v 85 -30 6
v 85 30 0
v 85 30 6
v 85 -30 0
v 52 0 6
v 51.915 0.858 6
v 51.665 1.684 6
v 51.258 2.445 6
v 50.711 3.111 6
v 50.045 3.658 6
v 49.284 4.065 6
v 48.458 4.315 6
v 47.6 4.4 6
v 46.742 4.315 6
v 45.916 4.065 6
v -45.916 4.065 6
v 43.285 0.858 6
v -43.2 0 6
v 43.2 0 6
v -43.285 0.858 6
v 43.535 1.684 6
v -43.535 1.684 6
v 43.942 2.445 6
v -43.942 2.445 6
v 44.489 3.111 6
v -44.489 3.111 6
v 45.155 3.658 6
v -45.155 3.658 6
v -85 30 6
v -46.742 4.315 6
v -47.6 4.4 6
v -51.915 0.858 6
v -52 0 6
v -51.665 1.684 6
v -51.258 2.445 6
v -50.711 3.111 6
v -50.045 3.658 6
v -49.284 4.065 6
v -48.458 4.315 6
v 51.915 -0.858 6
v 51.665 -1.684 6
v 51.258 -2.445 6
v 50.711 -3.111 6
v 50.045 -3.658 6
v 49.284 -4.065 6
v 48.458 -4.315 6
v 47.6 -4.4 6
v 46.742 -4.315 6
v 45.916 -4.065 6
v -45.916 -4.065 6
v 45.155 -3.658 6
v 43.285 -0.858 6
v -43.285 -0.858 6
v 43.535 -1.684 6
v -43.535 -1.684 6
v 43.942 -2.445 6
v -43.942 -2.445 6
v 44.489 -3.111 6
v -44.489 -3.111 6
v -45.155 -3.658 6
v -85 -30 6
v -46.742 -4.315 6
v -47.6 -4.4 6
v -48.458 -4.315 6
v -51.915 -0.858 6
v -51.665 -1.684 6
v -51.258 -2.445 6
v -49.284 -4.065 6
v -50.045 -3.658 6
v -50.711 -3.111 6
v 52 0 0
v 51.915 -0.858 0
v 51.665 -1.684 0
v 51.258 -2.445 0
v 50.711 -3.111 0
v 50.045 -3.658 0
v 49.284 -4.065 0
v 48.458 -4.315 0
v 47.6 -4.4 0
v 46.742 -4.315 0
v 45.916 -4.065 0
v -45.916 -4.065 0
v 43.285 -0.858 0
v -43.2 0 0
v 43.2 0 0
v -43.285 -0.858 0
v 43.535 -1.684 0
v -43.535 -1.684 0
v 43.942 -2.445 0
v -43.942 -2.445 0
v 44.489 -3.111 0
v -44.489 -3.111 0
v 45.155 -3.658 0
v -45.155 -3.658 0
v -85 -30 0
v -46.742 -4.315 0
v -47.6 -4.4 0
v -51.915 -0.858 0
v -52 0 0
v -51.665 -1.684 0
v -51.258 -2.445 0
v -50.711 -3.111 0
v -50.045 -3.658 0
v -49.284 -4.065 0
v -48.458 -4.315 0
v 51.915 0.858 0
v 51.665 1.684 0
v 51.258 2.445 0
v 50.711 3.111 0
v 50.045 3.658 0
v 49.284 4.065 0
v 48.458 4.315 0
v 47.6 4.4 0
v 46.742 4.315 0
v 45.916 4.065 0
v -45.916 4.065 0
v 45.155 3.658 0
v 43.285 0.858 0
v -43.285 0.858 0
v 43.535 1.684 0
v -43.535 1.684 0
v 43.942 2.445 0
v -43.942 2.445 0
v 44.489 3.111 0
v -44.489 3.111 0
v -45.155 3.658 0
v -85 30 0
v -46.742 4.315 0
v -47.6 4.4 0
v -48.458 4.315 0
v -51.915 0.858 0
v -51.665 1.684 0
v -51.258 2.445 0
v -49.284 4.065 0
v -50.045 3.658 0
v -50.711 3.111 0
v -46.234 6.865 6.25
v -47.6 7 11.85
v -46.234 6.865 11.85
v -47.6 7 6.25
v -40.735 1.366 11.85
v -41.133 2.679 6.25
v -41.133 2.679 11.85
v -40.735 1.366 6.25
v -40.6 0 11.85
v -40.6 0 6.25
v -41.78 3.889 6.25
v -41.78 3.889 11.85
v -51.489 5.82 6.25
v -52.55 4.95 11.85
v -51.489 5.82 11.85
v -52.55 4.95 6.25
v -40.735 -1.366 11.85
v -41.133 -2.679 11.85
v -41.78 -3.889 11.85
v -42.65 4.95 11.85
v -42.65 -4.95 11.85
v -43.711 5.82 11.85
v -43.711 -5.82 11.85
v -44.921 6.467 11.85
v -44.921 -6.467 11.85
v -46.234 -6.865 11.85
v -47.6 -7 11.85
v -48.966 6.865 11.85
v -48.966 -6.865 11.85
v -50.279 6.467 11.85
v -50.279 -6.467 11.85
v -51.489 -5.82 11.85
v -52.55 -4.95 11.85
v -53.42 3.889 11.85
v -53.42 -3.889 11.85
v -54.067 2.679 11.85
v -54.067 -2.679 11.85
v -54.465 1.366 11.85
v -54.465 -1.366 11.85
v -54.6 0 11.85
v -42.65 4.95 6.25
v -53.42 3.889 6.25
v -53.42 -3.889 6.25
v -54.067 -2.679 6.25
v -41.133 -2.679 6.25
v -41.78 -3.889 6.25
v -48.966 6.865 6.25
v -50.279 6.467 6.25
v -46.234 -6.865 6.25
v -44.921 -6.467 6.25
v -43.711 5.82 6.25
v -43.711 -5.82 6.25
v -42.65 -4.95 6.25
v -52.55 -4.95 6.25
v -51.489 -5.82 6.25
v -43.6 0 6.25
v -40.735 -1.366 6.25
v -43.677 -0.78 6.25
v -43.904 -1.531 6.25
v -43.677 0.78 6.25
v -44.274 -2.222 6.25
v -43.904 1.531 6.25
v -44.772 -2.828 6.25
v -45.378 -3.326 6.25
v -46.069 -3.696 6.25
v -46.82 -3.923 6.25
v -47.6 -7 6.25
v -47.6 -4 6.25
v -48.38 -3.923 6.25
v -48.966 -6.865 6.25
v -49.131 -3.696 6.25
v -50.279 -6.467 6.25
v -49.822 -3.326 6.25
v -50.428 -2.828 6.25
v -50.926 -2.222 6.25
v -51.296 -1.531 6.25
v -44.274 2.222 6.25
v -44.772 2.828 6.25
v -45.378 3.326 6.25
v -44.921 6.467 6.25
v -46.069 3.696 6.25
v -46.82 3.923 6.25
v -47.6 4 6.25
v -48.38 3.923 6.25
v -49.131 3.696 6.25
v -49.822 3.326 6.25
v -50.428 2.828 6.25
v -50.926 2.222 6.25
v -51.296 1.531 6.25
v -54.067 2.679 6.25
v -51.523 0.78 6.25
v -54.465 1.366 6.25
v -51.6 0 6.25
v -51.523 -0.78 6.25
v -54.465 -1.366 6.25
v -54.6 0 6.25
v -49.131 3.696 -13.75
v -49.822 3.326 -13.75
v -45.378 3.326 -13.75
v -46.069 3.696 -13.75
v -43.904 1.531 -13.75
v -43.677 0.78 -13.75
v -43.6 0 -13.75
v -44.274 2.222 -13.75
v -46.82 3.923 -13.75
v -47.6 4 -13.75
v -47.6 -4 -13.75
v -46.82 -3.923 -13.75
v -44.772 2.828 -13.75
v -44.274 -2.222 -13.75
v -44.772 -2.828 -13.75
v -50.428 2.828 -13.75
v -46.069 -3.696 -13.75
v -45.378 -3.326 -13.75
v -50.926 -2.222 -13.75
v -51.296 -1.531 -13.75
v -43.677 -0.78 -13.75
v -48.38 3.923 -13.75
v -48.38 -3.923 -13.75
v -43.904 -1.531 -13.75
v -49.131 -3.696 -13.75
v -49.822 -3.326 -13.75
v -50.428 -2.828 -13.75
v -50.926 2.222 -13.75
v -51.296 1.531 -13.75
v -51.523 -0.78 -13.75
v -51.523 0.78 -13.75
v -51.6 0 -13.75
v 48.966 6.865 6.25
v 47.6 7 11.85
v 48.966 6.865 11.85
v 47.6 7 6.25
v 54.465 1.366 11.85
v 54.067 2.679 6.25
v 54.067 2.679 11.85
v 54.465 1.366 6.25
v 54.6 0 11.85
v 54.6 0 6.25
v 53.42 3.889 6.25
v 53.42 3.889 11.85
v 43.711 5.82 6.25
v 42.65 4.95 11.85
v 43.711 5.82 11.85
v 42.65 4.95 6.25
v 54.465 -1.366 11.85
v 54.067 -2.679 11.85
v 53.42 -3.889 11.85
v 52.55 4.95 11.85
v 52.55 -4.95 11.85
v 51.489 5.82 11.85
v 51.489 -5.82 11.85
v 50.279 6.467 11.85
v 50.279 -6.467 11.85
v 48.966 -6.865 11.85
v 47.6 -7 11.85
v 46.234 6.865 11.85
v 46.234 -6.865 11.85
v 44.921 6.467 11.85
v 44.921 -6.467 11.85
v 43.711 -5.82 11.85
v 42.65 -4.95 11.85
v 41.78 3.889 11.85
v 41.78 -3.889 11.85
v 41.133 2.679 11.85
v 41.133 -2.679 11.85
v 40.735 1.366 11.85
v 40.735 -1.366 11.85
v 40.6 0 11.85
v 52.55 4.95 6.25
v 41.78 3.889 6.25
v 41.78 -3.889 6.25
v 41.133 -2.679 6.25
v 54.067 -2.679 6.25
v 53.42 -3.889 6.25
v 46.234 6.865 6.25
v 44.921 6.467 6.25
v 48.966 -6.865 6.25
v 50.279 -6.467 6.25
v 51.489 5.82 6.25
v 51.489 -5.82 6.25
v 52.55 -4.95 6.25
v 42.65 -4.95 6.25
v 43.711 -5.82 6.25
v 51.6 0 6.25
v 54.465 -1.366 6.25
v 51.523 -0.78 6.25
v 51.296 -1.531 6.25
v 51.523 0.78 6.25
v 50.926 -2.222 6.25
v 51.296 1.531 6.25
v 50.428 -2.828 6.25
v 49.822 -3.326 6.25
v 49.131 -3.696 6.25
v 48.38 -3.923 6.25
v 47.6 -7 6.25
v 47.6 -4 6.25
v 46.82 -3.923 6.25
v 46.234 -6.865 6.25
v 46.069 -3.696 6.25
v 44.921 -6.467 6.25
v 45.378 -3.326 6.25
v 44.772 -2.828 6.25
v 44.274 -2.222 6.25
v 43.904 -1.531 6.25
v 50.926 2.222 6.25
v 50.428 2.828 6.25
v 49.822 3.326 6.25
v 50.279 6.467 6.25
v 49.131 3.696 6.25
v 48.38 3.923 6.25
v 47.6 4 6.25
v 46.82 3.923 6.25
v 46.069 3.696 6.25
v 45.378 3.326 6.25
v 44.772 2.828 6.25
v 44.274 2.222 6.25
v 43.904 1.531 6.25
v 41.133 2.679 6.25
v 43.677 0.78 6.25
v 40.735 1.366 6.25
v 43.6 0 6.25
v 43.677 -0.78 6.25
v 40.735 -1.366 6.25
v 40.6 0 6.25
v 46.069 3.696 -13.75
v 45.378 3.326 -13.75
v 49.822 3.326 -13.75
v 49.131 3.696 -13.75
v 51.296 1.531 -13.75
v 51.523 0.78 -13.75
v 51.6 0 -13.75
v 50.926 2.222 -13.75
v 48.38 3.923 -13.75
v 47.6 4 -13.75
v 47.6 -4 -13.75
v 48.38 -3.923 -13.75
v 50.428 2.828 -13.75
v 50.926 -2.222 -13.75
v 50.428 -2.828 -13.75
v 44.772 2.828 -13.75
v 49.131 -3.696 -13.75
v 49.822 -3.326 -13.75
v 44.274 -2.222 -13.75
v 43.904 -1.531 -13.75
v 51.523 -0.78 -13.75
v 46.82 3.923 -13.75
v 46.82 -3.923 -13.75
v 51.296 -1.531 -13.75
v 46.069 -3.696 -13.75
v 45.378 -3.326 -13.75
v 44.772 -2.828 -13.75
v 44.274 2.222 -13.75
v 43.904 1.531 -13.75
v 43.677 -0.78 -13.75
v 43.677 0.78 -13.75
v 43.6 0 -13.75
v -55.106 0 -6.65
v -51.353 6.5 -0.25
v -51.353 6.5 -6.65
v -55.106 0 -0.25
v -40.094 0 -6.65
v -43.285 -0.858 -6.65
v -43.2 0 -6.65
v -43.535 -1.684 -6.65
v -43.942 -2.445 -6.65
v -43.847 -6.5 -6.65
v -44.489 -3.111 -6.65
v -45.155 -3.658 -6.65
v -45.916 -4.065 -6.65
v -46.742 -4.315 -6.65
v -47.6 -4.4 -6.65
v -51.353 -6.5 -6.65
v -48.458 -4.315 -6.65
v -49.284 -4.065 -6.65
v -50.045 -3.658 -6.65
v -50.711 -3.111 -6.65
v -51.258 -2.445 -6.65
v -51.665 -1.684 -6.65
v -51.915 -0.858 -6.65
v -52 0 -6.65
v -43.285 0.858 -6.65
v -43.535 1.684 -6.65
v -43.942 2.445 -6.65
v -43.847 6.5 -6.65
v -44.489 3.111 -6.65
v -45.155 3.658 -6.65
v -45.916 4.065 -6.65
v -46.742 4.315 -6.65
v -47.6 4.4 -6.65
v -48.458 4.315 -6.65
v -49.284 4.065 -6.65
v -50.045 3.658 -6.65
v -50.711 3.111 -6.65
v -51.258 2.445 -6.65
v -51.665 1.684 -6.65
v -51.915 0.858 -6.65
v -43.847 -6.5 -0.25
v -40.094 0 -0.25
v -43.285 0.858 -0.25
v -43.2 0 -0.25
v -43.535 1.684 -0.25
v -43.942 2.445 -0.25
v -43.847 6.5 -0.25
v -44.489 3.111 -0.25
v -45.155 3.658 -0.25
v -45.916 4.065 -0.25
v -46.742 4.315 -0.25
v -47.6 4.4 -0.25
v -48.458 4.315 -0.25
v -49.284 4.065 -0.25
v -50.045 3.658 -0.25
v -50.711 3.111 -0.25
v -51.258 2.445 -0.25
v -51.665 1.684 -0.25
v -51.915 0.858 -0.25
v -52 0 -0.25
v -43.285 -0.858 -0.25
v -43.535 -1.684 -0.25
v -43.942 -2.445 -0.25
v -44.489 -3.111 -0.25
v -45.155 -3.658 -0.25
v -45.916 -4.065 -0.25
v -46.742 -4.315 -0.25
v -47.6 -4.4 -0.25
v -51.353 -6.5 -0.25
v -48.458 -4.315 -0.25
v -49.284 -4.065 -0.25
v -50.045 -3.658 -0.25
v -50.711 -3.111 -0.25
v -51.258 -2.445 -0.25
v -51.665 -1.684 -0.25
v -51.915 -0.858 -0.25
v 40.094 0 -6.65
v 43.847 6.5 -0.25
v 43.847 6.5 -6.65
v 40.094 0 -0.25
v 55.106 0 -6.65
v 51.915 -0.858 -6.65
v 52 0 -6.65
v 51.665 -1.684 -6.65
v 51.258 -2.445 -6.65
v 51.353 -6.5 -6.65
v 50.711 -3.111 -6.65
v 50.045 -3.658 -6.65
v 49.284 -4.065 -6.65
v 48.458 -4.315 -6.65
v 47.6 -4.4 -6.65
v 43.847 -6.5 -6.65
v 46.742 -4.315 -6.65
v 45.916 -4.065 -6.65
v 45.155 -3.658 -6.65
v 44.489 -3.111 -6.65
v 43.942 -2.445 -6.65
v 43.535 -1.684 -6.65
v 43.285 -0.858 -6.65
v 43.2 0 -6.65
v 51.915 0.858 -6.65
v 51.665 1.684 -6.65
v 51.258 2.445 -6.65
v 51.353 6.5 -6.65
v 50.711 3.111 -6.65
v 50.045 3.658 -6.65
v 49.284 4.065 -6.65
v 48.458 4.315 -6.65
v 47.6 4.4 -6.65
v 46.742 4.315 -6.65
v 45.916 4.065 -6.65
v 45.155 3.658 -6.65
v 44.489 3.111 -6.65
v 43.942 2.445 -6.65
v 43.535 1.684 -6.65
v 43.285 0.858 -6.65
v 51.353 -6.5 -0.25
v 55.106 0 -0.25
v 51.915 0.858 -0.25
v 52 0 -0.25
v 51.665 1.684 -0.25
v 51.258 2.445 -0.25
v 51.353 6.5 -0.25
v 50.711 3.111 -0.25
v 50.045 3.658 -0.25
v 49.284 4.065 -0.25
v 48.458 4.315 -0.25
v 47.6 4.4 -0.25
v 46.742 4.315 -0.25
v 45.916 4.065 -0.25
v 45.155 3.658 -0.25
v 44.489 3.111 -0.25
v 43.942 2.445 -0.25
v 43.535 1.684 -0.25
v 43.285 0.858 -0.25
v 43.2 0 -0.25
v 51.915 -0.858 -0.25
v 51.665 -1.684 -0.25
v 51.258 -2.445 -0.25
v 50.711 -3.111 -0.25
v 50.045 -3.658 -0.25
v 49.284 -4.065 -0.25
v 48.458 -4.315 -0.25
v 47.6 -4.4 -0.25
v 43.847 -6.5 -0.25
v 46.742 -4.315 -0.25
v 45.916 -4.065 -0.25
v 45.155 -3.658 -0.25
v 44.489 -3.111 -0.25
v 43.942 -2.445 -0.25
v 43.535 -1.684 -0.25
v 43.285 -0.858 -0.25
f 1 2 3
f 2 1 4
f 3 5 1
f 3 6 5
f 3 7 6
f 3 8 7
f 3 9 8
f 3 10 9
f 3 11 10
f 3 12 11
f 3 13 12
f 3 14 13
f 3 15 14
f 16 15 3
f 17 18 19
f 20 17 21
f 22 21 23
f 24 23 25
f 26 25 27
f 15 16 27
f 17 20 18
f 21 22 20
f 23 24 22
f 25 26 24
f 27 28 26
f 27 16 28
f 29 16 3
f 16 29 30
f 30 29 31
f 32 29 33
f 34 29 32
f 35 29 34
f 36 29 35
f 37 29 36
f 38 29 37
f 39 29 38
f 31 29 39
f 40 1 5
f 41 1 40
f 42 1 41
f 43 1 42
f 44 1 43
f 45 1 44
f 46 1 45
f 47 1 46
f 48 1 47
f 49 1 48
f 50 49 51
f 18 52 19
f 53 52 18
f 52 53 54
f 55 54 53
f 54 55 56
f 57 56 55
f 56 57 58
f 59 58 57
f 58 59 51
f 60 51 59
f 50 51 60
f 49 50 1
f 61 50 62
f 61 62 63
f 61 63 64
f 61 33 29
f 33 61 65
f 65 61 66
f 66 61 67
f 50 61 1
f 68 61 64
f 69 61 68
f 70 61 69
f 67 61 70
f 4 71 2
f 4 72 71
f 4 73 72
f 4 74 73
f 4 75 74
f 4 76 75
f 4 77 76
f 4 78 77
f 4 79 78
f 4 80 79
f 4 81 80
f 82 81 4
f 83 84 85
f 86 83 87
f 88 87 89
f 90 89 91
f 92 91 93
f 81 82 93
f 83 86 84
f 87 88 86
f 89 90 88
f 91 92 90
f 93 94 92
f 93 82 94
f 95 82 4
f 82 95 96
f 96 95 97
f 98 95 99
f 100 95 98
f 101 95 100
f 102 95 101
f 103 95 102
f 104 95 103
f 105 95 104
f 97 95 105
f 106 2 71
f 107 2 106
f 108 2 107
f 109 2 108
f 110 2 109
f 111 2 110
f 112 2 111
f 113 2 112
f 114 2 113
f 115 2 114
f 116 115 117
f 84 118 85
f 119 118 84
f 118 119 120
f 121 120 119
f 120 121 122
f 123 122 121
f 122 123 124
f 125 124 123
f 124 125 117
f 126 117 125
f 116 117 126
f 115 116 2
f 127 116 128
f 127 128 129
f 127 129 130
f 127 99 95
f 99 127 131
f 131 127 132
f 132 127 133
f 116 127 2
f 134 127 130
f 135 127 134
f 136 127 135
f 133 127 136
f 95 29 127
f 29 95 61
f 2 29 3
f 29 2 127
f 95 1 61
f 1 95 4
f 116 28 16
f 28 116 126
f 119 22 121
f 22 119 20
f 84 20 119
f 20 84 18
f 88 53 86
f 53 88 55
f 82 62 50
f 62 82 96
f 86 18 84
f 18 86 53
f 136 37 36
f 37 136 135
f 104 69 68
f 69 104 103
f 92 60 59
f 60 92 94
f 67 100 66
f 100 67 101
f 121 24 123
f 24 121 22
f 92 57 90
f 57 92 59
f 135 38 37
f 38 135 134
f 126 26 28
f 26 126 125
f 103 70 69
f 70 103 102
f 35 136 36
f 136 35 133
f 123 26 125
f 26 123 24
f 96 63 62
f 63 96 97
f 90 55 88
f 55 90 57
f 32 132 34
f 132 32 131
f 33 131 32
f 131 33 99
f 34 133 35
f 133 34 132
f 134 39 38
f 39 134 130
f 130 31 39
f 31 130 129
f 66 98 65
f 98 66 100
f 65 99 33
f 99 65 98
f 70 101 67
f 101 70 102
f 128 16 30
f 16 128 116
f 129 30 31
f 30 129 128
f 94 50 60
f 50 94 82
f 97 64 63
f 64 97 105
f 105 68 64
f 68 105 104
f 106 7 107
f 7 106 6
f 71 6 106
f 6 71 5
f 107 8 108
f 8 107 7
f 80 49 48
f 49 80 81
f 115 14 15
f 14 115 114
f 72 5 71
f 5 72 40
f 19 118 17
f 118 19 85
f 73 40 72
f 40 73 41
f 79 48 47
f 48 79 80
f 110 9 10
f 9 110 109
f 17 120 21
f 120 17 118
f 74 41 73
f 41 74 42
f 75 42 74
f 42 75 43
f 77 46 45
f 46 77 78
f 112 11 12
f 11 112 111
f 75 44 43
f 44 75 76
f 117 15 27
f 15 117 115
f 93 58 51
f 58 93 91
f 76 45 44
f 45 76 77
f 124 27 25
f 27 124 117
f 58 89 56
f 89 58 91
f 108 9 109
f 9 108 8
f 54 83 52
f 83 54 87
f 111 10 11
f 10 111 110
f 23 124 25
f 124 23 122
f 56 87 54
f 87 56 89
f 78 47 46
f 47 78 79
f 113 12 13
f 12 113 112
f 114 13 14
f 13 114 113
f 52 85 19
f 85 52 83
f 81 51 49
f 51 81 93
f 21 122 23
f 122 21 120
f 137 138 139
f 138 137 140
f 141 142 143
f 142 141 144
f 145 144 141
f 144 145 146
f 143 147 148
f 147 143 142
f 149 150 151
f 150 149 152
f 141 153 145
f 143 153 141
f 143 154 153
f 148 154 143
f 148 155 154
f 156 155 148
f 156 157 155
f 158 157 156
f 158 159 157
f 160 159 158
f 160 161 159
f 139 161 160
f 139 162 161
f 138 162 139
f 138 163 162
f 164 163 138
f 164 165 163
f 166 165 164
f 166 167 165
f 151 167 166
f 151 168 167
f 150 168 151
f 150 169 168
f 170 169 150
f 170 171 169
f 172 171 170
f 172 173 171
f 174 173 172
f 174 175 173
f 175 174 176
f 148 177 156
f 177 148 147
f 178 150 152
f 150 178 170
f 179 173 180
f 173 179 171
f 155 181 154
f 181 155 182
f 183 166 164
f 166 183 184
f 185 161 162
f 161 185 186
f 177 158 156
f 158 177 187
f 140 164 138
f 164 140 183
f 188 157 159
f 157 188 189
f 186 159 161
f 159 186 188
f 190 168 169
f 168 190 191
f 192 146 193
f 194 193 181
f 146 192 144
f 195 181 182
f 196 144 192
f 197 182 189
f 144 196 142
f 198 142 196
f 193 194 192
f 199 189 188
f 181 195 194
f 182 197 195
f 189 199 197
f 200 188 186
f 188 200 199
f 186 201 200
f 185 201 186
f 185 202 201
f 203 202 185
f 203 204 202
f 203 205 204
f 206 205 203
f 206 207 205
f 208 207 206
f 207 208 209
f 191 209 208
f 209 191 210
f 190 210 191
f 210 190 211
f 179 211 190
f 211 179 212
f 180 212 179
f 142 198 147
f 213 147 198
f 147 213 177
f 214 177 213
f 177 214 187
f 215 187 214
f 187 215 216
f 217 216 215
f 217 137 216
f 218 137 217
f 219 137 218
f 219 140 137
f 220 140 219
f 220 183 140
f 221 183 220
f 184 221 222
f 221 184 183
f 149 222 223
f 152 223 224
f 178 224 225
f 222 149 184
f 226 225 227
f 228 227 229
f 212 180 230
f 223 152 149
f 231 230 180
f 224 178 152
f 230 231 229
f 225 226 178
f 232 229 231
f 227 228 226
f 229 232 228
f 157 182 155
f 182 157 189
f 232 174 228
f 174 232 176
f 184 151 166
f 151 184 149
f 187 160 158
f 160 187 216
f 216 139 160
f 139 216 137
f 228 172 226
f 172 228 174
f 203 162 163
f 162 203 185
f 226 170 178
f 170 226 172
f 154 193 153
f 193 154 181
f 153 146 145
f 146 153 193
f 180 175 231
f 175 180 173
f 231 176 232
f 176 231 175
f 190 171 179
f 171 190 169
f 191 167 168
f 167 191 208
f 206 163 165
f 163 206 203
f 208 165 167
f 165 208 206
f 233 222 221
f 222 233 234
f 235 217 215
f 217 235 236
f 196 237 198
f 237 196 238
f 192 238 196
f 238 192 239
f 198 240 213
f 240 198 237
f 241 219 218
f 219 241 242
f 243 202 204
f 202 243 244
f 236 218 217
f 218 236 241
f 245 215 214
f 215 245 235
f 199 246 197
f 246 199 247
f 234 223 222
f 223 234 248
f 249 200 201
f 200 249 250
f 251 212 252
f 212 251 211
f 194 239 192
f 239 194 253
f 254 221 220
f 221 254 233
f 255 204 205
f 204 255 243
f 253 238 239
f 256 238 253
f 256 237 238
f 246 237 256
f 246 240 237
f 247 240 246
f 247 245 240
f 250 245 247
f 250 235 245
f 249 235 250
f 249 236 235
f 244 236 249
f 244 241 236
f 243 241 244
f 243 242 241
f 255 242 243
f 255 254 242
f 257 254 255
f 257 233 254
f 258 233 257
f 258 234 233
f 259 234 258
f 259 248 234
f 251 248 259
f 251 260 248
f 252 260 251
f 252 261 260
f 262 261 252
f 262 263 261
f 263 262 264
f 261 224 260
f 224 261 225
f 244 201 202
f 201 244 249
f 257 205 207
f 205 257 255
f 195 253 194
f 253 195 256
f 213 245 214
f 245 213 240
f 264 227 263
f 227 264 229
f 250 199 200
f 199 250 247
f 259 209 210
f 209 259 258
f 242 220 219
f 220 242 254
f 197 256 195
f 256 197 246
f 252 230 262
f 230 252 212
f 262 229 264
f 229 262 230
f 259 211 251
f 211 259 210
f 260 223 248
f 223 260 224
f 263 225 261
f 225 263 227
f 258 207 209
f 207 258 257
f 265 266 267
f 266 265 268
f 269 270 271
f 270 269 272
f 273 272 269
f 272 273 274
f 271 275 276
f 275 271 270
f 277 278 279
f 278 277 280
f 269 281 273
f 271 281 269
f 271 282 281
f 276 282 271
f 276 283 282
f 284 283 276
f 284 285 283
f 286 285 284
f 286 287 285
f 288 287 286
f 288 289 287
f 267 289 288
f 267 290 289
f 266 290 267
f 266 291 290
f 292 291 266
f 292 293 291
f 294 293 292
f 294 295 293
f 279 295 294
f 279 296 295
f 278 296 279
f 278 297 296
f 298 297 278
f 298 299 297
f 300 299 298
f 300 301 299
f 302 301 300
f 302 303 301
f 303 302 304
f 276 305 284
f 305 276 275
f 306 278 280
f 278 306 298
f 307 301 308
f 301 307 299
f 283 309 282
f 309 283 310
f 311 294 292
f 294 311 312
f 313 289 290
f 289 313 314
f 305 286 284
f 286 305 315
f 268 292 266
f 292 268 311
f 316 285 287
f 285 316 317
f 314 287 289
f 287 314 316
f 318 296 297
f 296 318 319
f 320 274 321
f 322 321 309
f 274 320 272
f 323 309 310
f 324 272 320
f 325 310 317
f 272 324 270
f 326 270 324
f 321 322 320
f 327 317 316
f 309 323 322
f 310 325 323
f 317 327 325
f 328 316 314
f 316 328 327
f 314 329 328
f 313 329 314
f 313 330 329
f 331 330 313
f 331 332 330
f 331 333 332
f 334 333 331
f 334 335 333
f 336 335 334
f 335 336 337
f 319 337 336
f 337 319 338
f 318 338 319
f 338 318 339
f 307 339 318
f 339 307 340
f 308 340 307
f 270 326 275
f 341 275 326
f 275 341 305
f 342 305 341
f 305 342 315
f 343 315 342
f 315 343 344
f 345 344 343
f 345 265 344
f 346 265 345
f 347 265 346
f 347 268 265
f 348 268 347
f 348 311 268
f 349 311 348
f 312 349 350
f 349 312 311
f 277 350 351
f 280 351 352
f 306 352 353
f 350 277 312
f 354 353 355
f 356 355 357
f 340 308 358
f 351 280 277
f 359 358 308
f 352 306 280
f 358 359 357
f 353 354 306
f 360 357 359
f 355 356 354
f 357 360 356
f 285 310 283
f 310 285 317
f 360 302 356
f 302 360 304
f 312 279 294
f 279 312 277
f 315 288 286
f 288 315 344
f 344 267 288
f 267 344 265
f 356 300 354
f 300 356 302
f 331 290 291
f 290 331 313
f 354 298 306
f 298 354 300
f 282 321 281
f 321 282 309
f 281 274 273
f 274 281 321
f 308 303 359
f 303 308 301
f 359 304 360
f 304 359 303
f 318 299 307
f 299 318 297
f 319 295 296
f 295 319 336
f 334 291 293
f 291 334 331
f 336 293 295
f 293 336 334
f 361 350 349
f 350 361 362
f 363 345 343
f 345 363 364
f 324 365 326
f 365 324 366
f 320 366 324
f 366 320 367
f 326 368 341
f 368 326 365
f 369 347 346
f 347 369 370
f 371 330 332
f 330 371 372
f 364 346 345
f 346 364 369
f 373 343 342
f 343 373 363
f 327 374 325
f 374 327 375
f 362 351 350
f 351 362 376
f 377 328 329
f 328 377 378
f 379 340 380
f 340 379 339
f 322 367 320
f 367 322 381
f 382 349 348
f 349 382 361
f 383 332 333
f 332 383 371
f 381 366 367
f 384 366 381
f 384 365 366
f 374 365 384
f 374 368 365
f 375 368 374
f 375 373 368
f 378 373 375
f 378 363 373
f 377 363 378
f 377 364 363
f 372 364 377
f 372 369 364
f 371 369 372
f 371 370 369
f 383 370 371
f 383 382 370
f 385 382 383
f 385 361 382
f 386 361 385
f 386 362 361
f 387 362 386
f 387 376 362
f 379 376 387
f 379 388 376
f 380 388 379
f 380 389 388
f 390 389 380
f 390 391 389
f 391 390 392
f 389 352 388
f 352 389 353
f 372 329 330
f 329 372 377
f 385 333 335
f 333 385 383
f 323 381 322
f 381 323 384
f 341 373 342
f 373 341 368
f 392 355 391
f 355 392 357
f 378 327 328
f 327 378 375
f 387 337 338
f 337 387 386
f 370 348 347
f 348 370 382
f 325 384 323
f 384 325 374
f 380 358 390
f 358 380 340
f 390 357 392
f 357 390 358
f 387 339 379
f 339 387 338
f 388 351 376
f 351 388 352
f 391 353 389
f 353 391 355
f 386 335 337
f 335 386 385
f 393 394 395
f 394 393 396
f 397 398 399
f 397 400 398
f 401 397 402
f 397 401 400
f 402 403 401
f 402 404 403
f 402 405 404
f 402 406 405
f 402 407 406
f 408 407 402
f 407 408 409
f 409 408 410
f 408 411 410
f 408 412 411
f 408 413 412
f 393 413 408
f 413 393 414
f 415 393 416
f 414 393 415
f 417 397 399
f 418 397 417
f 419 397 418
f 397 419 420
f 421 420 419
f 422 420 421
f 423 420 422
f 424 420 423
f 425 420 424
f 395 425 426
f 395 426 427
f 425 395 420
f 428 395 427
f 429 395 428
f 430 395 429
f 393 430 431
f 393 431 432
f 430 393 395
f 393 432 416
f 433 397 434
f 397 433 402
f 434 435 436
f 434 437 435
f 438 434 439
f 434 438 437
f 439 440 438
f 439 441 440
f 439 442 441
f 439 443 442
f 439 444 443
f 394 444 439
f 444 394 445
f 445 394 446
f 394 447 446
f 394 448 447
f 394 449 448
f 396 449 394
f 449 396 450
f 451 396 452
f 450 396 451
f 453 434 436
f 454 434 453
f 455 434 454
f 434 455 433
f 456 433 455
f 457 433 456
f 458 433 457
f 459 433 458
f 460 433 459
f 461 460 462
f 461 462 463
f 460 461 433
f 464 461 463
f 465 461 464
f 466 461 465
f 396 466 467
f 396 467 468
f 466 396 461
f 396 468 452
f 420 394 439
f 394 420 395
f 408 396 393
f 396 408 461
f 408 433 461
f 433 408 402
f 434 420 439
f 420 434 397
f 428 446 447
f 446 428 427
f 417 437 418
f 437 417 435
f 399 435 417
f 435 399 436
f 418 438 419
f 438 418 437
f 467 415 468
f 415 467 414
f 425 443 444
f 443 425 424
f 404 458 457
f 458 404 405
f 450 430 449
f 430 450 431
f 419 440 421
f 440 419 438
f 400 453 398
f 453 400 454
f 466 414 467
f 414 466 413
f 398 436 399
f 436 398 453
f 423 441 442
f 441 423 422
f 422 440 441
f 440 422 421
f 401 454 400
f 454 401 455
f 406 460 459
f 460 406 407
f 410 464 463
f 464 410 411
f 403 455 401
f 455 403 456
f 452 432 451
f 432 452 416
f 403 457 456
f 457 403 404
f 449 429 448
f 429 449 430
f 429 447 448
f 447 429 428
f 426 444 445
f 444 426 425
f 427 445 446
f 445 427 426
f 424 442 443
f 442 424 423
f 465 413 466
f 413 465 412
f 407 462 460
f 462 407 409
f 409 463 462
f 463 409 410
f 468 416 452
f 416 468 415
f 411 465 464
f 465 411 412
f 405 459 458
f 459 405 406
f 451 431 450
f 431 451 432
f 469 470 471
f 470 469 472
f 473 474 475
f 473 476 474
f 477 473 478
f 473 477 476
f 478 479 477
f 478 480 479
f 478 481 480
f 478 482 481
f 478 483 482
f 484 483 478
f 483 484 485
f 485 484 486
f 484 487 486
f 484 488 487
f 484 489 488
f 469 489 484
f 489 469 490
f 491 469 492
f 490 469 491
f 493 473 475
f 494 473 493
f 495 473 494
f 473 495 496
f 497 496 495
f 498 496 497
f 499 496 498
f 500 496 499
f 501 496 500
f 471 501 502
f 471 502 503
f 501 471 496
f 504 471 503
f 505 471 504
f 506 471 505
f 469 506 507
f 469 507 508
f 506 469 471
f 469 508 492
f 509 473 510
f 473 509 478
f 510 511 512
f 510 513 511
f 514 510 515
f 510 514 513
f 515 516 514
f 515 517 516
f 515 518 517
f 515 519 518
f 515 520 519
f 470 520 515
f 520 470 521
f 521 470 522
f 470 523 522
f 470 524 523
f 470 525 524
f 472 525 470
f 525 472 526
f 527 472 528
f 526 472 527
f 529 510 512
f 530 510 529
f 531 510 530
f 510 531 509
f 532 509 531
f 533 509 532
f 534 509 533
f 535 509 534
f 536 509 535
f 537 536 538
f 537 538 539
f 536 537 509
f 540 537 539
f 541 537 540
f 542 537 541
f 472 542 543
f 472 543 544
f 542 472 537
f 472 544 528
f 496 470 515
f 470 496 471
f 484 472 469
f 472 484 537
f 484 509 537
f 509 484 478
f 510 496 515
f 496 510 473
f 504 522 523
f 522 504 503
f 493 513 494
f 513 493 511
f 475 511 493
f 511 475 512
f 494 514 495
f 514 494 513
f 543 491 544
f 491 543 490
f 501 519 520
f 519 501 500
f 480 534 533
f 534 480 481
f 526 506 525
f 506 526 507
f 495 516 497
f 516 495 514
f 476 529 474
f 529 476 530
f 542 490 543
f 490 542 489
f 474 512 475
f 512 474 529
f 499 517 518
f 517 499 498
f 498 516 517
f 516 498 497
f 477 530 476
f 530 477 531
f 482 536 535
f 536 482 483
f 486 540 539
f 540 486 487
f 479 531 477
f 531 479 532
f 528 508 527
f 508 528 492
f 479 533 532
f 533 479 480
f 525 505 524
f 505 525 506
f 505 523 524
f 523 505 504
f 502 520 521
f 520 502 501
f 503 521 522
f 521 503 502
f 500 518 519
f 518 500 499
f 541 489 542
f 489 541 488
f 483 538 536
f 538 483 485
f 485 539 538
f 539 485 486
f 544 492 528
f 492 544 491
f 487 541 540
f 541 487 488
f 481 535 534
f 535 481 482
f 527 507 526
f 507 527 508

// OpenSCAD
$fn = 32;

// ------------------------------------------------------------------------
// Bolted plate: 170 x 60 x 6 mm plate, 2 fasteners
// Every part is its own module, assembly() places them once.
// ------------------------------------------------------------------------

// --- part 1 ---
module plate() {
  difference() {
    translate([-85, -30, 0]) cube([170, 60, 6]);
    translate([-47.6, 0, -1]) cylinder(h = 8, d = 8.8);
    translate([47.6, 0, -1]) cylinder(h = 8, d = 8.8);
  }
}

// --- part 2 ---
module bolt1() {
  cylinder(h = 5.6, d = 14);
  translate([0, 0, -20]) cylinder(h = 20, d = 8);
}

// --- part 3 ---
module bolt2() {
  cylinder(h = 5.6, d = 14);
  translate([0, 0, -20]) cylinder(h = 20, d = 8);
}

// --- part 4 ---
module nut1() {
  difference() {
    linear_extrude(height = 6.4) polygon(points = [[7.506, 0], [3.753, 6.5], [-3.753, 6.5], [-7.506, 0], [-3.753, -6.5], [3.753, -6.5]]);
    translate([0, 0, -1]) cylinder(h = 8.4, d = 8.8);
  }
}

// --- part 5 ---
module nut2() {
  difference() {
    linear_extrude(height = 6.4) polygon(points = [[7.506, 0], [3.753, 6.5], [-3.753, 6.5], [-7.506, 0], [-3.753, -6.5], [3.753, -6.5]]);
    translate([0, 0, -1]) cylinder(h = 8.4, d = 8.8);
  }
}

// --- assembly ---
module assembly() {
  translate([0, 0, 0]) rotate([0, 0, 0]) plate();
  translate([-47.6, 0, 6.25]) rotate([0, 0, 0]) bolt1();
  translate([47.6, 0, 6.25]) rotate([0, 0, 0]) bolt2();
  translate([-47.6, 0, -6.65]) rotate([0, 0, 0]) nut1();
  translate([47.6, 0, -6.65]) rotate([0, 0, 0]) nut2();
}

assembly();
